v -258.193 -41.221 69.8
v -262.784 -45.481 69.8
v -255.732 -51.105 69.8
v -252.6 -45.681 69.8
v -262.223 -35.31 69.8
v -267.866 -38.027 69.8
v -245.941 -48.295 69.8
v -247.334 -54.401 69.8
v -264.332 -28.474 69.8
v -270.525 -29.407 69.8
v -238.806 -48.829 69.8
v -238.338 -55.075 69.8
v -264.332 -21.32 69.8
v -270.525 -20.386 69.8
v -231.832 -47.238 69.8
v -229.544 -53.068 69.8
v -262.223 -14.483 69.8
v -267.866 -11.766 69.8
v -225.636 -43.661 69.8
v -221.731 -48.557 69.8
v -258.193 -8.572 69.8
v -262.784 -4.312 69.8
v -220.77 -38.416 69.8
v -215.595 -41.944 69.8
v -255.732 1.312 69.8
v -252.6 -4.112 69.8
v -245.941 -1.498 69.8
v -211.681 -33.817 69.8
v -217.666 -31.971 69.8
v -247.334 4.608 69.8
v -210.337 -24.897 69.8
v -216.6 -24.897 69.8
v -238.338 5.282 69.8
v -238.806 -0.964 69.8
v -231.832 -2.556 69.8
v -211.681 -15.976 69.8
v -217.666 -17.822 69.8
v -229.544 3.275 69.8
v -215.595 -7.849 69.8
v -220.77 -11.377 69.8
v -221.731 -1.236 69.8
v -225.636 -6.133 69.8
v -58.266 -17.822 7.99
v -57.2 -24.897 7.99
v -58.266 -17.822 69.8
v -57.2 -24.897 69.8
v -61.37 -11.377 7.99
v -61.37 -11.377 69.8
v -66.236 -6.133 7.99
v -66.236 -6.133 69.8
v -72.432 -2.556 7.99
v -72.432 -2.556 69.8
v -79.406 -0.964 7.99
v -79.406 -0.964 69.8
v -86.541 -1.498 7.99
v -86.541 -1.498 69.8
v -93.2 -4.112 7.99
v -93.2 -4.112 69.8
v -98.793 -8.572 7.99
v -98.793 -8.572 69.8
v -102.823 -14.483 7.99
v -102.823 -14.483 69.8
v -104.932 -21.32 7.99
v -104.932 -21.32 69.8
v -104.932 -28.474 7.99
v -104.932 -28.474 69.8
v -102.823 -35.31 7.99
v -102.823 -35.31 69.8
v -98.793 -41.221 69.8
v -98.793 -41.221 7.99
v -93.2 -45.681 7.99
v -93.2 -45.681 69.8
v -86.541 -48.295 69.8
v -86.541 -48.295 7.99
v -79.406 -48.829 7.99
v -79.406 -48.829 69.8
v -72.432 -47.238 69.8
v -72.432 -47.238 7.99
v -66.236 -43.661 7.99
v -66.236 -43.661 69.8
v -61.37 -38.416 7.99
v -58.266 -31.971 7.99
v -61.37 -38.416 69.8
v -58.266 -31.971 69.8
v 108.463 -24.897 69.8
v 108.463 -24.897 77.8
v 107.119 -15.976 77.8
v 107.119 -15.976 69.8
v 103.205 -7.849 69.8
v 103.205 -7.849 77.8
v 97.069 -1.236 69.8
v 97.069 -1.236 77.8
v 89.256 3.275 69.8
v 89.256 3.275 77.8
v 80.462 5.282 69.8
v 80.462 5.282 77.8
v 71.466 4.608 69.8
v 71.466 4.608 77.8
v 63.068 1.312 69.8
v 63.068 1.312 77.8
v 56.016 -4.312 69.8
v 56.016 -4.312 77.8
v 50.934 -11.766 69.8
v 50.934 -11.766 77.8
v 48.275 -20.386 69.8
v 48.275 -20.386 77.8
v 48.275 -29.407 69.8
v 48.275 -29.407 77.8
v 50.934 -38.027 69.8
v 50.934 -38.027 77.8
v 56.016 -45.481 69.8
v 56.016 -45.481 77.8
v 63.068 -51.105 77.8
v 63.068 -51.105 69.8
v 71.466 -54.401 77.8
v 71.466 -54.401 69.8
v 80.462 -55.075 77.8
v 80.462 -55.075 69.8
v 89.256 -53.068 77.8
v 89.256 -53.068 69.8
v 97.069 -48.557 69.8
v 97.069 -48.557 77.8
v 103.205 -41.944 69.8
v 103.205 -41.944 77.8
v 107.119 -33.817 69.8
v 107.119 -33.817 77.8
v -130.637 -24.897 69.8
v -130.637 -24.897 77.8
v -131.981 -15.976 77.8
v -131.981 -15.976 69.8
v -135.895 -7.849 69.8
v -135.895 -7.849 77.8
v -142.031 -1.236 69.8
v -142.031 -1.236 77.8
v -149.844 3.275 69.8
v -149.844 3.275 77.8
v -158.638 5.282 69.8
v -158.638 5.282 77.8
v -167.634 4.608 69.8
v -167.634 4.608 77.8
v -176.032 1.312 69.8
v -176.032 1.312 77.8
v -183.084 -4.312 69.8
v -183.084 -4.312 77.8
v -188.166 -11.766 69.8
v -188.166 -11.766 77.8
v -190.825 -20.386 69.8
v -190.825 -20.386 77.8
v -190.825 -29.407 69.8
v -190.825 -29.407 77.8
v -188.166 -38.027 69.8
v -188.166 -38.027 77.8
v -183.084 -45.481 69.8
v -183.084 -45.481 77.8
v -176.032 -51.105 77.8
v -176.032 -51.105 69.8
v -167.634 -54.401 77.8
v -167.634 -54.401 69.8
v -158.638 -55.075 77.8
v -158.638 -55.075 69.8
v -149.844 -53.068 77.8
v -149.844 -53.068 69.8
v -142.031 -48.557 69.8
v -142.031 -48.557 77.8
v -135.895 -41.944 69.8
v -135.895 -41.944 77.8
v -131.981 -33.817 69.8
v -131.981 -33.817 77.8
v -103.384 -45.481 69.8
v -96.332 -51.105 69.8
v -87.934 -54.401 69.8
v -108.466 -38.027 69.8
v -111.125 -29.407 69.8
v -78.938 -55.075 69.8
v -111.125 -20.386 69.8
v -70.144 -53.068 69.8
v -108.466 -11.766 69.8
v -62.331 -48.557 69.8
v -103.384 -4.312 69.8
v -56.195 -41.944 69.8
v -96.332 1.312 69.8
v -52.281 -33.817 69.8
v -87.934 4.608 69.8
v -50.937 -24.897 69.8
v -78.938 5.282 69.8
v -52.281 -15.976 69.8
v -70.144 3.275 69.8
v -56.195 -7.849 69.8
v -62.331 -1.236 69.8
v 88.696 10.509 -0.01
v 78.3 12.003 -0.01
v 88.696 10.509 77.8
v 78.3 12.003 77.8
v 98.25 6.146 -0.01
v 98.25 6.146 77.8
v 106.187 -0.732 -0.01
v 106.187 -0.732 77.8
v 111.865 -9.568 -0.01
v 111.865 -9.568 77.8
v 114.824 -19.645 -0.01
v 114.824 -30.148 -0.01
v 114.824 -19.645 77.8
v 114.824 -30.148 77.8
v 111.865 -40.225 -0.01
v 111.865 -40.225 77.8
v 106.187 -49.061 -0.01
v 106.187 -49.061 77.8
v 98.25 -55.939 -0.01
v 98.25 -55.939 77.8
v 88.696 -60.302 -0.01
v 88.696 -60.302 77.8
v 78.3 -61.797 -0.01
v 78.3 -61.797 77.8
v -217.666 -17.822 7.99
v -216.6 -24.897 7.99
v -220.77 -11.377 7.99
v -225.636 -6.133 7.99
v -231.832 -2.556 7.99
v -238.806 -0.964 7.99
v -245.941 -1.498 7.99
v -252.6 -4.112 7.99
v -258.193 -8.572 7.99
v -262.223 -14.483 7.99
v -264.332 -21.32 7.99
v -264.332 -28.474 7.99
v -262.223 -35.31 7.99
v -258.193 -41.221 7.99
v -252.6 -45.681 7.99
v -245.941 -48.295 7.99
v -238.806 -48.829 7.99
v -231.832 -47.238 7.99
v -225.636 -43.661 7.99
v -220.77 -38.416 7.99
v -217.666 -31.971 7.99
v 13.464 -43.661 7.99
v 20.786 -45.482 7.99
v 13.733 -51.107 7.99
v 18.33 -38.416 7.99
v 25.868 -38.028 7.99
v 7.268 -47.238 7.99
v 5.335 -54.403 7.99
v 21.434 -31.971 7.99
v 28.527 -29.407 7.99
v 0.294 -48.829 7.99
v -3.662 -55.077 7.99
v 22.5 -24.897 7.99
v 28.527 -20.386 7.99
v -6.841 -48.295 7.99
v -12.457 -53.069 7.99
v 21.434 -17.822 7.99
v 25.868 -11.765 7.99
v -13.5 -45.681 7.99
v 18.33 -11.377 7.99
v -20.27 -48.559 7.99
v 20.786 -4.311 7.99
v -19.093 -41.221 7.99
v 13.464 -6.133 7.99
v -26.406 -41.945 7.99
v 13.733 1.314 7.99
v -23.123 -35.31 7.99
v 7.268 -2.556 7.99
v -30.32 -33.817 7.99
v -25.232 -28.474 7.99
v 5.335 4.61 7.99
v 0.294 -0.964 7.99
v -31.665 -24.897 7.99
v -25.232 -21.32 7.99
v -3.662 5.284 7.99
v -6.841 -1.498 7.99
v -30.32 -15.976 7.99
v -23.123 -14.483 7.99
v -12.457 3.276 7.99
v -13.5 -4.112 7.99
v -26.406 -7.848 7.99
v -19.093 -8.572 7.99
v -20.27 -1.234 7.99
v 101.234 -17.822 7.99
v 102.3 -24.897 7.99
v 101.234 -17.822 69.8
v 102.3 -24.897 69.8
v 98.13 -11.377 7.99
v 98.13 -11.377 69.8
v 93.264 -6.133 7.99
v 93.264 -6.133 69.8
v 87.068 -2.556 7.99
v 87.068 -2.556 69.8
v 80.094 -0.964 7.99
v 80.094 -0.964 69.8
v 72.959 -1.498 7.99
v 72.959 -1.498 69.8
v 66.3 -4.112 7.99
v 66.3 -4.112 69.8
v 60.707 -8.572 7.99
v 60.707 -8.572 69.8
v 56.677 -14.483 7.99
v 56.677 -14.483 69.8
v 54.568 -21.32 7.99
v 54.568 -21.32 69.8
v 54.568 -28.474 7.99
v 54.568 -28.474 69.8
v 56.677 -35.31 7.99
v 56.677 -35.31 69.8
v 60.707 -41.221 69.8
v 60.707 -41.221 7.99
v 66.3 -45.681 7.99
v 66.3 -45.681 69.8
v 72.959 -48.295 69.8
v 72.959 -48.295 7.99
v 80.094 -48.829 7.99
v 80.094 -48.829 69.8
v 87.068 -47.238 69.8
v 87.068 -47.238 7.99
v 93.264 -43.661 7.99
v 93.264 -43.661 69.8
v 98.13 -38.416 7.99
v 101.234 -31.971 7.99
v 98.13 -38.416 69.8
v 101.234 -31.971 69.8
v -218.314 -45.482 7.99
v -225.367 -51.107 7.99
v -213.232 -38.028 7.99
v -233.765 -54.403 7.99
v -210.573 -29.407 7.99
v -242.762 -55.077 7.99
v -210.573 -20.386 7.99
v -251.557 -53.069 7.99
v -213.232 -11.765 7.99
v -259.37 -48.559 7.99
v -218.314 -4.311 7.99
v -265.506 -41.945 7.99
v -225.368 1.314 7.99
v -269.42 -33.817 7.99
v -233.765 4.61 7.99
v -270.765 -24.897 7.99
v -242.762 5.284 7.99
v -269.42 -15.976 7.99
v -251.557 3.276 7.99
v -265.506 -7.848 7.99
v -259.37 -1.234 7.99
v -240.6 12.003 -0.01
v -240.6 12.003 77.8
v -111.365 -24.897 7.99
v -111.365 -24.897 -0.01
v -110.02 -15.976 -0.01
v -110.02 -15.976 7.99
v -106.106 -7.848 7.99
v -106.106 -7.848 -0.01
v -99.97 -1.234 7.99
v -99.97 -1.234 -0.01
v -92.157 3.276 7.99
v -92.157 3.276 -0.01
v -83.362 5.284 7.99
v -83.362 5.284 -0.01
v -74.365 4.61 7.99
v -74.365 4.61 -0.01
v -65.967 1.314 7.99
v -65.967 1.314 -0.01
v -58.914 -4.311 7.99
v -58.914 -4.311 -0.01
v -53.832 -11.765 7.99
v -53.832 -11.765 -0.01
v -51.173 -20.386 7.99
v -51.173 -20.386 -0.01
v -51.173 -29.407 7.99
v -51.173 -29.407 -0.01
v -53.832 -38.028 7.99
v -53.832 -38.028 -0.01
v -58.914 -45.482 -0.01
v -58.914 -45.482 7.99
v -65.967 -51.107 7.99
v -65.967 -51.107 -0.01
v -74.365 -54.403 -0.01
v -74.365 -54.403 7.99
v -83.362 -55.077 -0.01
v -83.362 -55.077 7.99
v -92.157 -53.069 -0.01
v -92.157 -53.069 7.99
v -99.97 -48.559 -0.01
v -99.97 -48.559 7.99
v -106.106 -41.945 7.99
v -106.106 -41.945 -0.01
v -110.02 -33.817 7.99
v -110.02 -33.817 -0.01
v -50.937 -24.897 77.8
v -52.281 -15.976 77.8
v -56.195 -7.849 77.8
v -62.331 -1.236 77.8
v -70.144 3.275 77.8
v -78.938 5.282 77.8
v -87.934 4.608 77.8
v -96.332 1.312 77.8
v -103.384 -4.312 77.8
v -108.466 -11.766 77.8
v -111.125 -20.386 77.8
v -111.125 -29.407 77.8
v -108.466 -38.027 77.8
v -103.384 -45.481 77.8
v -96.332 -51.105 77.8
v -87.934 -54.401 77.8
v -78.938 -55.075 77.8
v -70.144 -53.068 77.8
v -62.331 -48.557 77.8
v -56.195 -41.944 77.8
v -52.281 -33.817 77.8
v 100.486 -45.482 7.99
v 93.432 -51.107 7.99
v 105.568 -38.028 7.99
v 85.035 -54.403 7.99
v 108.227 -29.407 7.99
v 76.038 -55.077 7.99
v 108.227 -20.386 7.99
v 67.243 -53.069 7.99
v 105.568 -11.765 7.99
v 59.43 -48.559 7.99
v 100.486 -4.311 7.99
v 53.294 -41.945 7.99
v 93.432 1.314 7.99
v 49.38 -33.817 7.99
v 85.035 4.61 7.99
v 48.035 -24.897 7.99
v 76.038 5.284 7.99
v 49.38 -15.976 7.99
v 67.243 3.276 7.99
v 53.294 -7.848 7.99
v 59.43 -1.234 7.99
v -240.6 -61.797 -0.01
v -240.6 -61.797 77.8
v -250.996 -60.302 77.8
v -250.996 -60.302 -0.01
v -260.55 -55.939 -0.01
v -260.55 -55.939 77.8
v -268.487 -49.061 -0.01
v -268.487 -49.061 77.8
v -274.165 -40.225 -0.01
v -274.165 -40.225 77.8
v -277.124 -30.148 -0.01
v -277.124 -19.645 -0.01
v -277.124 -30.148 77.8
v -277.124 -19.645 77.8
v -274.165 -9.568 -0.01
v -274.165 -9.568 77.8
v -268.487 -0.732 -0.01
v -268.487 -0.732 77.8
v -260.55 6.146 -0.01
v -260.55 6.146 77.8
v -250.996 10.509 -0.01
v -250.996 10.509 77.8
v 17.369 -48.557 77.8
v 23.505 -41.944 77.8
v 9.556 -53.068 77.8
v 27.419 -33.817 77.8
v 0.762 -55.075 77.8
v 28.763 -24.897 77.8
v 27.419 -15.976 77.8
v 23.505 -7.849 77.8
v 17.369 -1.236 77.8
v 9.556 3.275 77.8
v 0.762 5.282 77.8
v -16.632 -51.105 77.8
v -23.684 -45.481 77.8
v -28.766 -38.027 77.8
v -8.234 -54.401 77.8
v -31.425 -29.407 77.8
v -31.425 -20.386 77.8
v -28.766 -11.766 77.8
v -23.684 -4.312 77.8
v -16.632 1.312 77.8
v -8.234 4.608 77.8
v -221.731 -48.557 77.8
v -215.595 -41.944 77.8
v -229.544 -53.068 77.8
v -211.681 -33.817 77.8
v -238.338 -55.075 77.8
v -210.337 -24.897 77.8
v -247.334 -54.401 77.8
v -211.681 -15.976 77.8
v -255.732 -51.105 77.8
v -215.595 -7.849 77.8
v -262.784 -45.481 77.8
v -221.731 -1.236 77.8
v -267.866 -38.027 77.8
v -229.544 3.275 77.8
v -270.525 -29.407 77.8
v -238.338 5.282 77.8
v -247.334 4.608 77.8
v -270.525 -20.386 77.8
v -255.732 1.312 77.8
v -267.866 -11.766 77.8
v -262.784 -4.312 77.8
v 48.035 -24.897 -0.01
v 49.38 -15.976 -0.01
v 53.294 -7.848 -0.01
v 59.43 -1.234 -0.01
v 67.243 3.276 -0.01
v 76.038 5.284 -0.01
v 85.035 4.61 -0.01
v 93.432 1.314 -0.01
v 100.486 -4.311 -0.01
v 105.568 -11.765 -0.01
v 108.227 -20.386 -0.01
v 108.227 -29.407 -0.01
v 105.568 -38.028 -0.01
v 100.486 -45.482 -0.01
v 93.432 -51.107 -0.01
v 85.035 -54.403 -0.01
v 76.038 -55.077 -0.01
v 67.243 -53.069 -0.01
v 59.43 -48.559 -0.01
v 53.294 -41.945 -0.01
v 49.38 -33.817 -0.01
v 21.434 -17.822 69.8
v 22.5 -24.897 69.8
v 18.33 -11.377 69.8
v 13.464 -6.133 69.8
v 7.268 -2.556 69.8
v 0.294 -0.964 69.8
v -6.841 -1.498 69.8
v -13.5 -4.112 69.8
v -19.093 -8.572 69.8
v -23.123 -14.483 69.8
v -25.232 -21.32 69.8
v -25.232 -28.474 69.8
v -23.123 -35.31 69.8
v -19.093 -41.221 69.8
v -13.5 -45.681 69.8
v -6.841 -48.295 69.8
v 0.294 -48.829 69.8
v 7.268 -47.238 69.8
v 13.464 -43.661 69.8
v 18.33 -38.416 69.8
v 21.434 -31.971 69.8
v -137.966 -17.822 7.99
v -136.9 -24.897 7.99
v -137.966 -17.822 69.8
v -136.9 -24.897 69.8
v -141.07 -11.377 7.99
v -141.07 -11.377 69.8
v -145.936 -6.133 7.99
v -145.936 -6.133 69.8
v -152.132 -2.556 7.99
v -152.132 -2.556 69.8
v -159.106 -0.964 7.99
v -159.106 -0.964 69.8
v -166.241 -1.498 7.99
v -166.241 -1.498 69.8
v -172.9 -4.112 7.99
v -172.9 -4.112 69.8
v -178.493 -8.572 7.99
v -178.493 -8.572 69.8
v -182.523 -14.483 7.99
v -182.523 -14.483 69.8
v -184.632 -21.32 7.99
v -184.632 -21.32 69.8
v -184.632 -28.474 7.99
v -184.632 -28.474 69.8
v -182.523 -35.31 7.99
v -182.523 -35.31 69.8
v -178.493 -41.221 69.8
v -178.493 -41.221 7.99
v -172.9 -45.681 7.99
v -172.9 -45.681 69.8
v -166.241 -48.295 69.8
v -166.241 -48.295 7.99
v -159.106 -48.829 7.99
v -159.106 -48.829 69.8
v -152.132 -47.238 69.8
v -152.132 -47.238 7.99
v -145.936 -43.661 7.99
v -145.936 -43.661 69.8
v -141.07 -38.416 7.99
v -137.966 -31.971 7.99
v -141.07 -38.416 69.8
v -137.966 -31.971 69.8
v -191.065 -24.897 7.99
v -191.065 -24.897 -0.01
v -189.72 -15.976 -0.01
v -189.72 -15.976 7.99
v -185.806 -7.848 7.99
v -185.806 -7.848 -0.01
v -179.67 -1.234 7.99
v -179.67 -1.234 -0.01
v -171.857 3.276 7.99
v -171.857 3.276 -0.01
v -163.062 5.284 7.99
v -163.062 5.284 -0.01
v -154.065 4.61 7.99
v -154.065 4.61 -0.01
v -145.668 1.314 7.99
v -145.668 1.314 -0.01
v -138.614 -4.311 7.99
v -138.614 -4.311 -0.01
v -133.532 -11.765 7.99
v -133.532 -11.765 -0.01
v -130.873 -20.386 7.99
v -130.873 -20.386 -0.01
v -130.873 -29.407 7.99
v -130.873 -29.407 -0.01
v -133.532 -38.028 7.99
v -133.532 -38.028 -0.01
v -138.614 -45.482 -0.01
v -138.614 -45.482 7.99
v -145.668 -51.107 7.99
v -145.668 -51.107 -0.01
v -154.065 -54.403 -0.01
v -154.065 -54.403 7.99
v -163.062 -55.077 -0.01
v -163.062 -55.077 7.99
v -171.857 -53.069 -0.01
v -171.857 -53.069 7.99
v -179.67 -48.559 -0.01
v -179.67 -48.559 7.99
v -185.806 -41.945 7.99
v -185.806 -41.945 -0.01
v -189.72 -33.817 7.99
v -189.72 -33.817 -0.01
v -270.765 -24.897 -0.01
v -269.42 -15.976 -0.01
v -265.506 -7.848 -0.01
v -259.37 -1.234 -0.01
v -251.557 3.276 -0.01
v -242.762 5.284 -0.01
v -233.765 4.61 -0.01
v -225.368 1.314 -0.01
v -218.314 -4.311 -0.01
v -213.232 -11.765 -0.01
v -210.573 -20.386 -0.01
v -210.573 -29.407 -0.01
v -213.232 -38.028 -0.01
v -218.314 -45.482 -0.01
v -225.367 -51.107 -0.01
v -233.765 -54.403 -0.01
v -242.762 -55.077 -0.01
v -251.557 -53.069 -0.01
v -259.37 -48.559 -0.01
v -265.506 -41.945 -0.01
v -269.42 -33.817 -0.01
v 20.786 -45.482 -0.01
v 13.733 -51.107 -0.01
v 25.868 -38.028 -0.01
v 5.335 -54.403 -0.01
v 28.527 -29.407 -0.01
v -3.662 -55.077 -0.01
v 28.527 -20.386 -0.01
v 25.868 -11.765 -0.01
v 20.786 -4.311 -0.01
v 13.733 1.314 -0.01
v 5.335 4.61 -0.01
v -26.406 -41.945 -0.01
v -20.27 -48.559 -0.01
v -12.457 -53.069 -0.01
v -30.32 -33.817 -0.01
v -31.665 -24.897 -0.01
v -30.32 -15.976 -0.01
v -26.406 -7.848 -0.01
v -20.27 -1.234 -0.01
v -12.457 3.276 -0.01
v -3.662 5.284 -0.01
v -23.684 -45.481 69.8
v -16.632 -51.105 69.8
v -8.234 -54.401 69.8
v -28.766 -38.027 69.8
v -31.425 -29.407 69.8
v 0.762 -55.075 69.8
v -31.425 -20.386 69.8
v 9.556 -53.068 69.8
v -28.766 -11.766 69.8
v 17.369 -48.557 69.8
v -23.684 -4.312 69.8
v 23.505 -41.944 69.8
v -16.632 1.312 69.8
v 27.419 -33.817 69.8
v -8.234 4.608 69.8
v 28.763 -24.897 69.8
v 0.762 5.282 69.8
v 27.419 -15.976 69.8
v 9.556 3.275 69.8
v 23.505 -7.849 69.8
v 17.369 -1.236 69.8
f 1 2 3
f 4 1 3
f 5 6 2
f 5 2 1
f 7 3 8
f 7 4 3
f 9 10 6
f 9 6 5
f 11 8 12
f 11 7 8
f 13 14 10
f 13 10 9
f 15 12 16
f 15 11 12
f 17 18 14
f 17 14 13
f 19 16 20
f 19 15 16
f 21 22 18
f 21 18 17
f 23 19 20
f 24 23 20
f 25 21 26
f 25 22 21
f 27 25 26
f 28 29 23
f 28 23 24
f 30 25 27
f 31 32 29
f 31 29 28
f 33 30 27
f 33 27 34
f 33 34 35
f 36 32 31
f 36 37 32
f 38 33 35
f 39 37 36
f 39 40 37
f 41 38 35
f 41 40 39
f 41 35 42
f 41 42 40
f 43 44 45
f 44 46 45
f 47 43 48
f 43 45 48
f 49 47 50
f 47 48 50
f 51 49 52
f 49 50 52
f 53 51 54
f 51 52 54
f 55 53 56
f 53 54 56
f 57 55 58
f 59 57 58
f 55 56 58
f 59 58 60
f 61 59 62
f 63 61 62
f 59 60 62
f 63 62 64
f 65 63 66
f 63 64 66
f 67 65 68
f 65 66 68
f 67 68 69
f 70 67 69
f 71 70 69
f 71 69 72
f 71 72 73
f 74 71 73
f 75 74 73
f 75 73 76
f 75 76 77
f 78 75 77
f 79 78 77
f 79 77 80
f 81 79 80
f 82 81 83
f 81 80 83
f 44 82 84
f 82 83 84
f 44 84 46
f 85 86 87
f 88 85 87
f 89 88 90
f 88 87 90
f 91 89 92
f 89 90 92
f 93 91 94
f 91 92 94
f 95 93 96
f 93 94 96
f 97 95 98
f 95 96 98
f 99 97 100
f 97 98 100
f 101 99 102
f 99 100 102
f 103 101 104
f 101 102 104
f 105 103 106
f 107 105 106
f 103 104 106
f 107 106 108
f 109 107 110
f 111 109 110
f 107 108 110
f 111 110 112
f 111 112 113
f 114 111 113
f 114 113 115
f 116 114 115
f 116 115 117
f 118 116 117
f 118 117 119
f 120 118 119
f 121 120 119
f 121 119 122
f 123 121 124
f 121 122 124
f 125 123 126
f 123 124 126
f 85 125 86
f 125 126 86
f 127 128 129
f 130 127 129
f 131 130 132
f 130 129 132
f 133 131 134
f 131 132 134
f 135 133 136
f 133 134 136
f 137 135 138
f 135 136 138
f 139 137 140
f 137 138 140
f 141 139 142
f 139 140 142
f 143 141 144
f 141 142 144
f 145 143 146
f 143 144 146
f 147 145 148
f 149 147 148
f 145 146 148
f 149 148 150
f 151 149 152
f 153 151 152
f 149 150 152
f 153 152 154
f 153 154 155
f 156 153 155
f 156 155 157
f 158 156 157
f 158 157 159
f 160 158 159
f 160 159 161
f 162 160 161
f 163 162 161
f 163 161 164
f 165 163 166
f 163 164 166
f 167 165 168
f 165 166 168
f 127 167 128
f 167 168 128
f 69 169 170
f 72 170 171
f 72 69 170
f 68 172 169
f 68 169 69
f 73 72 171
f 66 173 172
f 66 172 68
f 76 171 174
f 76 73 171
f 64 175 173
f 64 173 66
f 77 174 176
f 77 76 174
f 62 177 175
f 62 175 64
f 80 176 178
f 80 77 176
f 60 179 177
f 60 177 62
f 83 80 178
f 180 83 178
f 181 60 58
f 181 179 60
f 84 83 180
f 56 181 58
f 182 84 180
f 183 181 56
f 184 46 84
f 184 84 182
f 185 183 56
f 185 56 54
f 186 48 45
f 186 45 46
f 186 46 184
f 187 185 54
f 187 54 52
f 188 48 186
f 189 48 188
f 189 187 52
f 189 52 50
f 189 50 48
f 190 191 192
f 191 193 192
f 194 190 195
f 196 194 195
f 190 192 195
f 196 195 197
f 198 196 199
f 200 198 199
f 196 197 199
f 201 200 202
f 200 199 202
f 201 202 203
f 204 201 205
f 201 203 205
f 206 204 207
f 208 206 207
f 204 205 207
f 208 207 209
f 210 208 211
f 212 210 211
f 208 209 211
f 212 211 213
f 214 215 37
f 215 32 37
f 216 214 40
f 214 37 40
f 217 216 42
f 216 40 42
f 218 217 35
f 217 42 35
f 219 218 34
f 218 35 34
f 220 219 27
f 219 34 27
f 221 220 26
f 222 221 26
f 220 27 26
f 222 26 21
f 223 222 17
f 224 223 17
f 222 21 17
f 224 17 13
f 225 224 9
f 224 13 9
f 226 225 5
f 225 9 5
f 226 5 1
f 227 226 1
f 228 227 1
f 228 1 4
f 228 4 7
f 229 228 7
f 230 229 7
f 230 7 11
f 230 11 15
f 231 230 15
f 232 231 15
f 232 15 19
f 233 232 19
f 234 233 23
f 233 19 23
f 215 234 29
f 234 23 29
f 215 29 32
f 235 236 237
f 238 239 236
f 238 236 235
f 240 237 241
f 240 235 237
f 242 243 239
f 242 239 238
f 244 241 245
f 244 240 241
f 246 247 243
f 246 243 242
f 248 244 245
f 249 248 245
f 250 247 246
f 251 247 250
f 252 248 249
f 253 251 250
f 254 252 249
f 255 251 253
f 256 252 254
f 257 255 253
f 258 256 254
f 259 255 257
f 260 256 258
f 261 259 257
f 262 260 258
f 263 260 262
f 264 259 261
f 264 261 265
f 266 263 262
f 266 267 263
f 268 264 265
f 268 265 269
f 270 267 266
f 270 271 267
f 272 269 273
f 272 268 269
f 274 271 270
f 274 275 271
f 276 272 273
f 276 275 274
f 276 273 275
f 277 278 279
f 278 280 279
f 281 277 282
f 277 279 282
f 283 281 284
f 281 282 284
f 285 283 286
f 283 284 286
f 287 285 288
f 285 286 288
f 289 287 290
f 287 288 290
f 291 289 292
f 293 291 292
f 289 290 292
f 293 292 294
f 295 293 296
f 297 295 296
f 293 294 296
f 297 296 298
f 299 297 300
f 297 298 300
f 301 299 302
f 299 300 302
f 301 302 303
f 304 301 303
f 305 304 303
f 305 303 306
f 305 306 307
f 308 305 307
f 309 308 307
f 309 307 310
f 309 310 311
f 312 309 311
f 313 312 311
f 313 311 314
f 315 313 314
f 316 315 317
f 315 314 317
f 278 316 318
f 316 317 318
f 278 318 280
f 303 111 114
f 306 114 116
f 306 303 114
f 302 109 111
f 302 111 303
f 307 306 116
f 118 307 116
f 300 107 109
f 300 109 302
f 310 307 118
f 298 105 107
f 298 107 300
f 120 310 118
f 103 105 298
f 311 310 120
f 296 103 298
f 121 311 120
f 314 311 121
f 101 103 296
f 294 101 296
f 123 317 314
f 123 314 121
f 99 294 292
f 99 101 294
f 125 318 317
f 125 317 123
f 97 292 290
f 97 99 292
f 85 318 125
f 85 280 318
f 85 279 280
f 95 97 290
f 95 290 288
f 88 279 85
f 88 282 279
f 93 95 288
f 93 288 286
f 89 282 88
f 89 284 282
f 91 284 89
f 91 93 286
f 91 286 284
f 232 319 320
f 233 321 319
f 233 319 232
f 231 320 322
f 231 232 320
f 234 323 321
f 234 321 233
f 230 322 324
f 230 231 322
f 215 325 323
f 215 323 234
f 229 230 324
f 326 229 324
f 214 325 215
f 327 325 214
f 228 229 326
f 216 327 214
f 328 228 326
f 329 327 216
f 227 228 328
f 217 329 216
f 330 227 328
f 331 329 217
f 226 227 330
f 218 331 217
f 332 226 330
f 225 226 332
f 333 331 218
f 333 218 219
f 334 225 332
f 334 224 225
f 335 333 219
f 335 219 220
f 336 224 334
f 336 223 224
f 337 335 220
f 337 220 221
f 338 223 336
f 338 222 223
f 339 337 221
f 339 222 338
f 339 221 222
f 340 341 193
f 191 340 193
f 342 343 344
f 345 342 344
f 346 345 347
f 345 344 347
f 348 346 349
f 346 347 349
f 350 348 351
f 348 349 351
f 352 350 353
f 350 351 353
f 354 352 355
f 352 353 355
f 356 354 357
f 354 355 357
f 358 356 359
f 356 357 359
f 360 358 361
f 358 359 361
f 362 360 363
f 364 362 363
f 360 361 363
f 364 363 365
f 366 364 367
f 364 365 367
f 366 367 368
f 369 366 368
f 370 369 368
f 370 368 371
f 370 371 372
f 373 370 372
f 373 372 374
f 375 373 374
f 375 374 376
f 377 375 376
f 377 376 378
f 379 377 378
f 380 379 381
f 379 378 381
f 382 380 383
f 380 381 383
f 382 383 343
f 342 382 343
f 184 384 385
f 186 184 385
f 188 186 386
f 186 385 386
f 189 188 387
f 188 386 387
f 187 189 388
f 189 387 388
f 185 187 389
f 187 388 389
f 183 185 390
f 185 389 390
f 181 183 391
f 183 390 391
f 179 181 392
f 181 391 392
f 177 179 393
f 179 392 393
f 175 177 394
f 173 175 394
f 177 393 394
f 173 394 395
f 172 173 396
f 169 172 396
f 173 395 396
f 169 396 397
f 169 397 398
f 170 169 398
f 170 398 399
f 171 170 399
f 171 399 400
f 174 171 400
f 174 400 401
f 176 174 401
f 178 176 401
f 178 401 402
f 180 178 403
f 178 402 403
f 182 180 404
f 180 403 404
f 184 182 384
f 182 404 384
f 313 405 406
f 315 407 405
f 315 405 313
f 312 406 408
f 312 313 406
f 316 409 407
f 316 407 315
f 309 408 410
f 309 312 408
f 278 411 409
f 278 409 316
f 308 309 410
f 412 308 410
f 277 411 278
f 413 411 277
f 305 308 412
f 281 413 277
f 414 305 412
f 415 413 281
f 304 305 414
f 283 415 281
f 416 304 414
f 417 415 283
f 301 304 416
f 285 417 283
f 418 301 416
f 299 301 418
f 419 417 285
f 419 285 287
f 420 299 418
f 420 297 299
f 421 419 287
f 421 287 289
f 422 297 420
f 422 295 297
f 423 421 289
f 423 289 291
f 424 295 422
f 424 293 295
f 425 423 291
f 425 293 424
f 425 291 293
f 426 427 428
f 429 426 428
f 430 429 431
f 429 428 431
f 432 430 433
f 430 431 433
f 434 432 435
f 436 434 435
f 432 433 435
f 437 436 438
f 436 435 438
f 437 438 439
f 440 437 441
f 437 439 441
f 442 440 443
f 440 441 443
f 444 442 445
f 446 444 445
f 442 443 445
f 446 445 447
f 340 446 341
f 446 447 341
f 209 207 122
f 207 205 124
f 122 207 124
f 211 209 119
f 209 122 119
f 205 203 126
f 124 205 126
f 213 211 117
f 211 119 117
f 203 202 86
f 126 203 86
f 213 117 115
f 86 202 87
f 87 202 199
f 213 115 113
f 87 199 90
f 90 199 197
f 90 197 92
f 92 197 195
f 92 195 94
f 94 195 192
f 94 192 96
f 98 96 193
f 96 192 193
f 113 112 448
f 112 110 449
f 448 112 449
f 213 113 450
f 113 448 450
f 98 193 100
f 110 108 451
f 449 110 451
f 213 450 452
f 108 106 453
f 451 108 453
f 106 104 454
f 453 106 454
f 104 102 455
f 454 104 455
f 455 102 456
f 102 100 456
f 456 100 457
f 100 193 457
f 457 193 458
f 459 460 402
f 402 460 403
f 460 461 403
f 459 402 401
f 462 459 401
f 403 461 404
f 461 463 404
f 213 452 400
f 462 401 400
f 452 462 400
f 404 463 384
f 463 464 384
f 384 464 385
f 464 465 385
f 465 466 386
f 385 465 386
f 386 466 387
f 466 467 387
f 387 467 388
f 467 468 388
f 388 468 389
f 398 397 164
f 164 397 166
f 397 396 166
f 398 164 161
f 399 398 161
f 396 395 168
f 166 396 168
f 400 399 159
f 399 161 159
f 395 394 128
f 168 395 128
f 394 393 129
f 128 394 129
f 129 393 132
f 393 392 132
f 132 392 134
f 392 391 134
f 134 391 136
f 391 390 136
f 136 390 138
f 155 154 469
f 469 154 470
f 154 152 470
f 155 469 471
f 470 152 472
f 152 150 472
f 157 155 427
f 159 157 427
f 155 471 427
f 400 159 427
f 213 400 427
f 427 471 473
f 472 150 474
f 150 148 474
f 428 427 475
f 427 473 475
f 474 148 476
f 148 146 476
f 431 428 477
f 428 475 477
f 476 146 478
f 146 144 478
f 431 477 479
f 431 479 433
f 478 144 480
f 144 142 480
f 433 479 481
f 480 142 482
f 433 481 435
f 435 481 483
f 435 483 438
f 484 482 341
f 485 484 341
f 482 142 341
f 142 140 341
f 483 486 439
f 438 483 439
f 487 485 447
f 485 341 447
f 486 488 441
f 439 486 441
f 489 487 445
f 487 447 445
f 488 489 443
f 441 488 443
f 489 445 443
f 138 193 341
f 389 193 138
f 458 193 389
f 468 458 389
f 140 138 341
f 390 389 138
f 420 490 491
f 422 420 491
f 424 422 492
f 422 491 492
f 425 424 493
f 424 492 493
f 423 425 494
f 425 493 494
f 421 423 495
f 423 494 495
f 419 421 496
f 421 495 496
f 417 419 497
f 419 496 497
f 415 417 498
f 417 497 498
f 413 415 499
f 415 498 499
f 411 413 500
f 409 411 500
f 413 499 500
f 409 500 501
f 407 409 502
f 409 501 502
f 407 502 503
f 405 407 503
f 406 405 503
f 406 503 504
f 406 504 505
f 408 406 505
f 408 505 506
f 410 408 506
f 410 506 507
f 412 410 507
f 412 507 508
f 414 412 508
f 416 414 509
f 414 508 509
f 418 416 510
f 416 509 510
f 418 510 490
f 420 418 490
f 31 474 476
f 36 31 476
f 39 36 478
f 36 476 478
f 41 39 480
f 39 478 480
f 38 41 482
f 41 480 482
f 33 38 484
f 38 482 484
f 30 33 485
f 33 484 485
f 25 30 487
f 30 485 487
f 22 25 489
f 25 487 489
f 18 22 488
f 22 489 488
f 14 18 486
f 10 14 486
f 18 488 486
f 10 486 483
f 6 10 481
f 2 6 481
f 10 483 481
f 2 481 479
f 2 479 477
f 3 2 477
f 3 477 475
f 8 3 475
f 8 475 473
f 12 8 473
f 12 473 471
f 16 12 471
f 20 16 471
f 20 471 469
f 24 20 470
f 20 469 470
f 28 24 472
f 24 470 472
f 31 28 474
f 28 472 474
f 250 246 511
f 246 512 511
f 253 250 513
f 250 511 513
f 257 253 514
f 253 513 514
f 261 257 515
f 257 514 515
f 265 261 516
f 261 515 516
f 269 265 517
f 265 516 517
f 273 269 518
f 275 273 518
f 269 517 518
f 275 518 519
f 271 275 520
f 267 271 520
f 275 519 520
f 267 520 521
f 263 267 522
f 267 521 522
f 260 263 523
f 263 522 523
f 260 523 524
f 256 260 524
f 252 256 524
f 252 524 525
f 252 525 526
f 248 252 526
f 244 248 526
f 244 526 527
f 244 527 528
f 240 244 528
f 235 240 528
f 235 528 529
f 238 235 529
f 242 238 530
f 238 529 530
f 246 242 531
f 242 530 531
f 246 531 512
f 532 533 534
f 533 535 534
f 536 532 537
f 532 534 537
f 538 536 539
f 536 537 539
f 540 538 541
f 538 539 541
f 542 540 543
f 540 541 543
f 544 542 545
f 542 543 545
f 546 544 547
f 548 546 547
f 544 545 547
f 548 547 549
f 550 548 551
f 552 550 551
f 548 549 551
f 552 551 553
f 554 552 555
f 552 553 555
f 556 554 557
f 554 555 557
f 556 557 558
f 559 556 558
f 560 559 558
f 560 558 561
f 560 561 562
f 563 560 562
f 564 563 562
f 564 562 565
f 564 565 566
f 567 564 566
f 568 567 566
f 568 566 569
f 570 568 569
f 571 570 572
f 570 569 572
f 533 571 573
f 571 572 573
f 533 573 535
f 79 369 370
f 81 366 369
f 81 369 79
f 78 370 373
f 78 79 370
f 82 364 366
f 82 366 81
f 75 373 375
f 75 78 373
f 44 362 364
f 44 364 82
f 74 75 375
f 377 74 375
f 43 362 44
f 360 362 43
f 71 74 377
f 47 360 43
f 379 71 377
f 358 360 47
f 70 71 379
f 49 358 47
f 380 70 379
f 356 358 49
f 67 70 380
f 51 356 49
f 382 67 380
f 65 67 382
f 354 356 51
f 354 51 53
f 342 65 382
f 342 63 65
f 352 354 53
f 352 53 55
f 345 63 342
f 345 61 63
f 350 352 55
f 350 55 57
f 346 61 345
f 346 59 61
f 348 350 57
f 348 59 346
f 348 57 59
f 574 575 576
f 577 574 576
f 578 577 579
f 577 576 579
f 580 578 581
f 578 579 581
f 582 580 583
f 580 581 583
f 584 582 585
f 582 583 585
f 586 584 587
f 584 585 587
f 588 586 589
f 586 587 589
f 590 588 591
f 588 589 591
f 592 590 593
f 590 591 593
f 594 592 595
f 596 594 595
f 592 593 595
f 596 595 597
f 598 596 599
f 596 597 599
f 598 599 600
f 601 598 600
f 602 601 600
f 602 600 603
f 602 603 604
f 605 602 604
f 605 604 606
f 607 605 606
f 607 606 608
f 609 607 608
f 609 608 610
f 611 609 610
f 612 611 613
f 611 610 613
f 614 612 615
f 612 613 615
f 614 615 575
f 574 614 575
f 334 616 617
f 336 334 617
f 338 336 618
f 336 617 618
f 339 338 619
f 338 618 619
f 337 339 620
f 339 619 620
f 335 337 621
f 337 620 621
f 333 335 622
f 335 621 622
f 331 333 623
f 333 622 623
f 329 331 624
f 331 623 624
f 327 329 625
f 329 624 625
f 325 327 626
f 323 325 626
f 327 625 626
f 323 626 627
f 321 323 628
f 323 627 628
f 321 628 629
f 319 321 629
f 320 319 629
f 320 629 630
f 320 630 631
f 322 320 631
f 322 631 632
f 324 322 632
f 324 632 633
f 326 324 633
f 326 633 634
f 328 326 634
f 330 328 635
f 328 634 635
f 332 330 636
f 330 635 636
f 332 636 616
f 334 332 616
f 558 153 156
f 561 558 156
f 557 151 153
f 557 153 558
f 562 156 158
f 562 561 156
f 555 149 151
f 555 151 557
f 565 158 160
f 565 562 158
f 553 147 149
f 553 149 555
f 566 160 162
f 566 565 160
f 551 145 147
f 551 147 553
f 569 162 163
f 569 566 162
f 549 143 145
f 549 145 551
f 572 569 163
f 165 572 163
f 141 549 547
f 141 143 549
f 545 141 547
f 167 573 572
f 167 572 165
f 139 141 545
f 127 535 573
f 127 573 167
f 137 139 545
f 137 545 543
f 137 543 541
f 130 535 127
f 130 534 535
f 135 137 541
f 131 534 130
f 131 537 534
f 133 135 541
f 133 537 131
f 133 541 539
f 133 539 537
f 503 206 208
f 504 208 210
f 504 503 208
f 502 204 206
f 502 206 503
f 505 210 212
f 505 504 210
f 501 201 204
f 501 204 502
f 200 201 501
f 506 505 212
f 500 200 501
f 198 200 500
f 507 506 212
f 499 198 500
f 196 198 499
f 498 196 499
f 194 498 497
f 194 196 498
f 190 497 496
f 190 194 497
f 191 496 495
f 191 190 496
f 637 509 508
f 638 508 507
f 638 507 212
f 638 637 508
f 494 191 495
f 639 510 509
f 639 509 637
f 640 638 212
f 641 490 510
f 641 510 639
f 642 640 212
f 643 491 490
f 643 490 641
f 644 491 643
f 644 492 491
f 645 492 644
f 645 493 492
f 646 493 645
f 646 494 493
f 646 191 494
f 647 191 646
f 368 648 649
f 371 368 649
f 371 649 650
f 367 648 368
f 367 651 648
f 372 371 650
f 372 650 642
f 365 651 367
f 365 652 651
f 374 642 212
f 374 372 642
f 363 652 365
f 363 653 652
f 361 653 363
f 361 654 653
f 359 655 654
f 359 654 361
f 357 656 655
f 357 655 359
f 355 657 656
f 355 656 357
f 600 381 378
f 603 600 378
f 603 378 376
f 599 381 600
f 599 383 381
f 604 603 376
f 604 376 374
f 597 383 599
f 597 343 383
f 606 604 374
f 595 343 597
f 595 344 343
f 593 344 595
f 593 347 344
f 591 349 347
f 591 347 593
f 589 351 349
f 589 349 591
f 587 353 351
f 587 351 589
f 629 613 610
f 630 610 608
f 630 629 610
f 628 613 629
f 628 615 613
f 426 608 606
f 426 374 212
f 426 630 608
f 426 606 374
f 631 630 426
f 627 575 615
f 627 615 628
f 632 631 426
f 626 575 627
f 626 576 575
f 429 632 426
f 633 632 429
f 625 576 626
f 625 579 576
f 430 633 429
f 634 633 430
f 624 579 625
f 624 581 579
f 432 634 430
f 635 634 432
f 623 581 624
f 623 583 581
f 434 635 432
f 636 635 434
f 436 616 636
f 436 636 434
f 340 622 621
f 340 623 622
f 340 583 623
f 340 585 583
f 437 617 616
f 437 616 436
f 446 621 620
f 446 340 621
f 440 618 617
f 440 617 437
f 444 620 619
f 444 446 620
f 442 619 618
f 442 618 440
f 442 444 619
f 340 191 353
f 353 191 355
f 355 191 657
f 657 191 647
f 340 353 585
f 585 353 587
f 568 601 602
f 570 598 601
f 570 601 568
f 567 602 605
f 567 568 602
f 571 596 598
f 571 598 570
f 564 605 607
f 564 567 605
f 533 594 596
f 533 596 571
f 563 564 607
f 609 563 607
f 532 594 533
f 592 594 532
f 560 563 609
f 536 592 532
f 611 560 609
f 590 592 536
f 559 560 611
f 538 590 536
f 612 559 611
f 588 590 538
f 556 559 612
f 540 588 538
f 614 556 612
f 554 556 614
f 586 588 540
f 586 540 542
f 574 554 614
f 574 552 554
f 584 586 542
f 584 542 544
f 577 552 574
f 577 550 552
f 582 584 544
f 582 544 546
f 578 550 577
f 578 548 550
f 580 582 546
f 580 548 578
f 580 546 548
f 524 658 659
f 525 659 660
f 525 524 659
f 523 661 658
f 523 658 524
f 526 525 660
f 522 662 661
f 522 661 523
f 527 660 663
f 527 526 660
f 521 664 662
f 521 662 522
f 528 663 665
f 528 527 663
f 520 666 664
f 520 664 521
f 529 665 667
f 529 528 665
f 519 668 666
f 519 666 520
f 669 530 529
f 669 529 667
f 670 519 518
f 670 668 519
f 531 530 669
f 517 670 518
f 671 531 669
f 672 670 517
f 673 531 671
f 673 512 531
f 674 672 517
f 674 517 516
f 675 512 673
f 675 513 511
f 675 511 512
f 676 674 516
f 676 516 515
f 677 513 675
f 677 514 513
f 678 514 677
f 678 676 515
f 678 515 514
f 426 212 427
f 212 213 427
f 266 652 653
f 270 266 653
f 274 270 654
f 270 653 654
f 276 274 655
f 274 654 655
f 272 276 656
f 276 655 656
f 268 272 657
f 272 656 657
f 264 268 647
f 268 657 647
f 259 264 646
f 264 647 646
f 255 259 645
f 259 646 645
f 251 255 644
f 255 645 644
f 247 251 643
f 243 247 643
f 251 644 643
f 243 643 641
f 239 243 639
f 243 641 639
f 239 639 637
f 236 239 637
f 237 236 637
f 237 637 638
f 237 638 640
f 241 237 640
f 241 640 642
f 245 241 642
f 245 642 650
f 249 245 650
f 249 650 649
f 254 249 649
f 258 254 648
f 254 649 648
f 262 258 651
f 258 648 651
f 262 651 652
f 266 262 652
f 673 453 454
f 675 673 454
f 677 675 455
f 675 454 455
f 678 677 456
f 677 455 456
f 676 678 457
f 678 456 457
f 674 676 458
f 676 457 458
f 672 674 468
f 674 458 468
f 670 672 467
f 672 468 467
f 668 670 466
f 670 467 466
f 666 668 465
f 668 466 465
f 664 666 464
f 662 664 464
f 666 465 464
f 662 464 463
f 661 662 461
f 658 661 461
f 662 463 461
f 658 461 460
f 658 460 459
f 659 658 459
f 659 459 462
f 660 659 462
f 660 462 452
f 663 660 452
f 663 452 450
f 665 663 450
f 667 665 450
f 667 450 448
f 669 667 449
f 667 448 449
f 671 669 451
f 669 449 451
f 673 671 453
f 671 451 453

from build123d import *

# Parameters (mm, degrees)
SKETCH1_R                = 24
BOSS_EXTRUDE4_DEPTH      = 77.8
BOSS_EXTRUDE4_DEPTH_BACK = 0.01
SKETCH6_R                = 30.26307147
CUT_EXTRUDE1_DEPTH       = 8
SKETCH9_R                = 30.265
CUT_EXTRUDE2_DEPTH       = 8


with BuildPart() as part:
    # Sketch1 → Boss-Extrude4 (new body, two sides)
    with BuildSketch(Plane.XY) as boss_extrude4_sk:
        with BuildLine():
            Line((-240.6, 12.003445454), (78.3, 12.003445454))
            ThreePointArc((78.3, 12.003445454), (115.2, -24.896554546), (78.3, -61.796554546))
            Line((78.3, -61.796554546), (-240.6, -61.796554546))
            ThreePointArc((-240.6, -61.796554546), (-277.5, -24.896554546), (-240.6, 12.003445454))
        make_face()
        with Locations((-240.6, -24.896554546)):
            Circle(SKETCH1_R, mode=Mode.SUBTRACT)
        with Locations((-160.9, -24.896554546)):
            Circle(SKETCH1_R, mode=Mode.SUBTRACT)
        with Locations((-81.2, -24.896554546)):
            Circle(SKETCH1_R, mode=Mode.SUBTRACT)
        with Locations((-1.5, -24.896554546)):
            Circle(SKETCH1_R, mode=Mode.SUBTRACT)
        with Locations((78.3, -24.896554546)):
            Circle(SKETCH1_R, mode=Mode.SUBTRACT)
    extrude(amount=BOSS_EXTRUDE4_DEPTH)
    extrude(boss_extrude4_sk.sketch, amount=-BOSS_EXTRUDE4_DEPTH_BACK)

    # Sketch6 → Cut-Extrude1 (cut)
    with BuildSketch(Plane.XY.offset(77.8)):
        with Locations((-240.6, -24.896554546)):
            Circle(SKETCH6_R)
        with Locations((-160.9, -24.896554546)):
            Circle(SKETCH6_R)
        with Locations((-81.2, -24.896554546)):
            Circle(SKETCH6_R)
        with Locations((-1.5, -24.896554546)):
            Circle(SKETCH6_R)
        with Locations((78.2, -24.896554546)):
            Circle(SKETCH6_R)
    extrude(amount=-CUT_EXTRUDE1_DEPTH, mode=Mode.SUBTRACT)

    # Sketch9 → Cut-Extrude2 (cut)
    with BuildSketch(Plane(origin=(0, 0, -0.01), x_dir=(-1, 0, 0), z_dir=(0, 0, -1))):
        with Locations((-78.3, -24.896554546)):
            Circle(SKETCH9_R)
        with Locations((1.4, -24.896554546)):
            Circle(SKETCH9_R)
        with Locations((81.1, -24.896554546)):
            Circle(SKETCH9_R)
        with Locations((160.8, -24.896554546)):
            Circle(SKETCH9_R)
        with Locations((240.5, -24.896554546)):
            Circle(SKETCH9_R)
    extrude(amount=-CUT_EXTRUDE2_DEPTH, mode=Mode.SUBTRACT)


solid = part.part
